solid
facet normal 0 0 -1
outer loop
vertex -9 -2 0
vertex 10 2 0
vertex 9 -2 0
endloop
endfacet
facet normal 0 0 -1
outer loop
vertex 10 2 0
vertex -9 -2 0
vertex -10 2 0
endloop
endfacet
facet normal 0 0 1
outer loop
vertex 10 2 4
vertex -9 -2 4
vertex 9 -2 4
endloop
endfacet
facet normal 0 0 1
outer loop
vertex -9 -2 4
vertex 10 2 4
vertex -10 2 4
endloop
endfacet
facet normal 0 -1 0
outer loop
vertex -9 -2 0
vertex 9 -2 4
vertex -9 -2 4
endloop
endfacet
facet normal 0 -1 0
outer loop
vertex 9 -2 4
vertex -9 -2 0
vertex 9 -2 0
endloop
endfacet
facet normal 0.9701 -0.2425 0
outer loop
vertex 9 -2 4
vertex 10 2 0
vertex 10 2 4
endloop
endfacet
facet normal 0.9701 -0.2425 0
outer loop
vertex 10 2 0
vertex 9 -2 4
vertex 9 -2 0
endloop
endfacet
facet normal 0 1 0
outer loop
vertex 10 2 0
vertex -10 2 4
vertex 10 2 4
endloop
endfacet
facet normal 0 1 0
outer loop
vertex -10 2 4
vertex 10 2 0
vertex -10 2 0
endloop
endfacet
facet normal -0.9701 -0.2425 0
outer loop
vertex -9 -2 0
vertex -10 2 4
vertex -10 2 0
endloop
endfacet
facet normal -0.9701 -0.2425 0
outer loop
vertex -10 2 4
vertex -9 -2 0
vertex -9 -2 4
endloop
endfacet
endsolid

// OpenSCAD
// Rectangular shaft key with chamfered ends.
$fn = 60;
eps = 0.02;
key_w = 4;
key_h = 4;
key_l = 20;
chamfer = 1;
polyhedron(points = [
    [-key_l / 2 + chamfer, -key_w / 2, 0], [key_l / 2 - chamfer, -key_w / 2, 0], [key_l / 2, key_w / 2, 0], [-key_l / 2, key_w / 2, 0],
    [-key_l / 2 + chamfer, -key_w / 2, key_h], [key_l / 2 - chamfer, -key_w / 2, key_h], [key_l / 2, key_w / 2, key_h], [-key_l / 2, key_w / 2, key_h]
], faces = [[0,1,2,3],[4,7,6,5],[0,4,5,1],[1,5,6,2],[2,6,7,3],[3,7,4,0]]);
